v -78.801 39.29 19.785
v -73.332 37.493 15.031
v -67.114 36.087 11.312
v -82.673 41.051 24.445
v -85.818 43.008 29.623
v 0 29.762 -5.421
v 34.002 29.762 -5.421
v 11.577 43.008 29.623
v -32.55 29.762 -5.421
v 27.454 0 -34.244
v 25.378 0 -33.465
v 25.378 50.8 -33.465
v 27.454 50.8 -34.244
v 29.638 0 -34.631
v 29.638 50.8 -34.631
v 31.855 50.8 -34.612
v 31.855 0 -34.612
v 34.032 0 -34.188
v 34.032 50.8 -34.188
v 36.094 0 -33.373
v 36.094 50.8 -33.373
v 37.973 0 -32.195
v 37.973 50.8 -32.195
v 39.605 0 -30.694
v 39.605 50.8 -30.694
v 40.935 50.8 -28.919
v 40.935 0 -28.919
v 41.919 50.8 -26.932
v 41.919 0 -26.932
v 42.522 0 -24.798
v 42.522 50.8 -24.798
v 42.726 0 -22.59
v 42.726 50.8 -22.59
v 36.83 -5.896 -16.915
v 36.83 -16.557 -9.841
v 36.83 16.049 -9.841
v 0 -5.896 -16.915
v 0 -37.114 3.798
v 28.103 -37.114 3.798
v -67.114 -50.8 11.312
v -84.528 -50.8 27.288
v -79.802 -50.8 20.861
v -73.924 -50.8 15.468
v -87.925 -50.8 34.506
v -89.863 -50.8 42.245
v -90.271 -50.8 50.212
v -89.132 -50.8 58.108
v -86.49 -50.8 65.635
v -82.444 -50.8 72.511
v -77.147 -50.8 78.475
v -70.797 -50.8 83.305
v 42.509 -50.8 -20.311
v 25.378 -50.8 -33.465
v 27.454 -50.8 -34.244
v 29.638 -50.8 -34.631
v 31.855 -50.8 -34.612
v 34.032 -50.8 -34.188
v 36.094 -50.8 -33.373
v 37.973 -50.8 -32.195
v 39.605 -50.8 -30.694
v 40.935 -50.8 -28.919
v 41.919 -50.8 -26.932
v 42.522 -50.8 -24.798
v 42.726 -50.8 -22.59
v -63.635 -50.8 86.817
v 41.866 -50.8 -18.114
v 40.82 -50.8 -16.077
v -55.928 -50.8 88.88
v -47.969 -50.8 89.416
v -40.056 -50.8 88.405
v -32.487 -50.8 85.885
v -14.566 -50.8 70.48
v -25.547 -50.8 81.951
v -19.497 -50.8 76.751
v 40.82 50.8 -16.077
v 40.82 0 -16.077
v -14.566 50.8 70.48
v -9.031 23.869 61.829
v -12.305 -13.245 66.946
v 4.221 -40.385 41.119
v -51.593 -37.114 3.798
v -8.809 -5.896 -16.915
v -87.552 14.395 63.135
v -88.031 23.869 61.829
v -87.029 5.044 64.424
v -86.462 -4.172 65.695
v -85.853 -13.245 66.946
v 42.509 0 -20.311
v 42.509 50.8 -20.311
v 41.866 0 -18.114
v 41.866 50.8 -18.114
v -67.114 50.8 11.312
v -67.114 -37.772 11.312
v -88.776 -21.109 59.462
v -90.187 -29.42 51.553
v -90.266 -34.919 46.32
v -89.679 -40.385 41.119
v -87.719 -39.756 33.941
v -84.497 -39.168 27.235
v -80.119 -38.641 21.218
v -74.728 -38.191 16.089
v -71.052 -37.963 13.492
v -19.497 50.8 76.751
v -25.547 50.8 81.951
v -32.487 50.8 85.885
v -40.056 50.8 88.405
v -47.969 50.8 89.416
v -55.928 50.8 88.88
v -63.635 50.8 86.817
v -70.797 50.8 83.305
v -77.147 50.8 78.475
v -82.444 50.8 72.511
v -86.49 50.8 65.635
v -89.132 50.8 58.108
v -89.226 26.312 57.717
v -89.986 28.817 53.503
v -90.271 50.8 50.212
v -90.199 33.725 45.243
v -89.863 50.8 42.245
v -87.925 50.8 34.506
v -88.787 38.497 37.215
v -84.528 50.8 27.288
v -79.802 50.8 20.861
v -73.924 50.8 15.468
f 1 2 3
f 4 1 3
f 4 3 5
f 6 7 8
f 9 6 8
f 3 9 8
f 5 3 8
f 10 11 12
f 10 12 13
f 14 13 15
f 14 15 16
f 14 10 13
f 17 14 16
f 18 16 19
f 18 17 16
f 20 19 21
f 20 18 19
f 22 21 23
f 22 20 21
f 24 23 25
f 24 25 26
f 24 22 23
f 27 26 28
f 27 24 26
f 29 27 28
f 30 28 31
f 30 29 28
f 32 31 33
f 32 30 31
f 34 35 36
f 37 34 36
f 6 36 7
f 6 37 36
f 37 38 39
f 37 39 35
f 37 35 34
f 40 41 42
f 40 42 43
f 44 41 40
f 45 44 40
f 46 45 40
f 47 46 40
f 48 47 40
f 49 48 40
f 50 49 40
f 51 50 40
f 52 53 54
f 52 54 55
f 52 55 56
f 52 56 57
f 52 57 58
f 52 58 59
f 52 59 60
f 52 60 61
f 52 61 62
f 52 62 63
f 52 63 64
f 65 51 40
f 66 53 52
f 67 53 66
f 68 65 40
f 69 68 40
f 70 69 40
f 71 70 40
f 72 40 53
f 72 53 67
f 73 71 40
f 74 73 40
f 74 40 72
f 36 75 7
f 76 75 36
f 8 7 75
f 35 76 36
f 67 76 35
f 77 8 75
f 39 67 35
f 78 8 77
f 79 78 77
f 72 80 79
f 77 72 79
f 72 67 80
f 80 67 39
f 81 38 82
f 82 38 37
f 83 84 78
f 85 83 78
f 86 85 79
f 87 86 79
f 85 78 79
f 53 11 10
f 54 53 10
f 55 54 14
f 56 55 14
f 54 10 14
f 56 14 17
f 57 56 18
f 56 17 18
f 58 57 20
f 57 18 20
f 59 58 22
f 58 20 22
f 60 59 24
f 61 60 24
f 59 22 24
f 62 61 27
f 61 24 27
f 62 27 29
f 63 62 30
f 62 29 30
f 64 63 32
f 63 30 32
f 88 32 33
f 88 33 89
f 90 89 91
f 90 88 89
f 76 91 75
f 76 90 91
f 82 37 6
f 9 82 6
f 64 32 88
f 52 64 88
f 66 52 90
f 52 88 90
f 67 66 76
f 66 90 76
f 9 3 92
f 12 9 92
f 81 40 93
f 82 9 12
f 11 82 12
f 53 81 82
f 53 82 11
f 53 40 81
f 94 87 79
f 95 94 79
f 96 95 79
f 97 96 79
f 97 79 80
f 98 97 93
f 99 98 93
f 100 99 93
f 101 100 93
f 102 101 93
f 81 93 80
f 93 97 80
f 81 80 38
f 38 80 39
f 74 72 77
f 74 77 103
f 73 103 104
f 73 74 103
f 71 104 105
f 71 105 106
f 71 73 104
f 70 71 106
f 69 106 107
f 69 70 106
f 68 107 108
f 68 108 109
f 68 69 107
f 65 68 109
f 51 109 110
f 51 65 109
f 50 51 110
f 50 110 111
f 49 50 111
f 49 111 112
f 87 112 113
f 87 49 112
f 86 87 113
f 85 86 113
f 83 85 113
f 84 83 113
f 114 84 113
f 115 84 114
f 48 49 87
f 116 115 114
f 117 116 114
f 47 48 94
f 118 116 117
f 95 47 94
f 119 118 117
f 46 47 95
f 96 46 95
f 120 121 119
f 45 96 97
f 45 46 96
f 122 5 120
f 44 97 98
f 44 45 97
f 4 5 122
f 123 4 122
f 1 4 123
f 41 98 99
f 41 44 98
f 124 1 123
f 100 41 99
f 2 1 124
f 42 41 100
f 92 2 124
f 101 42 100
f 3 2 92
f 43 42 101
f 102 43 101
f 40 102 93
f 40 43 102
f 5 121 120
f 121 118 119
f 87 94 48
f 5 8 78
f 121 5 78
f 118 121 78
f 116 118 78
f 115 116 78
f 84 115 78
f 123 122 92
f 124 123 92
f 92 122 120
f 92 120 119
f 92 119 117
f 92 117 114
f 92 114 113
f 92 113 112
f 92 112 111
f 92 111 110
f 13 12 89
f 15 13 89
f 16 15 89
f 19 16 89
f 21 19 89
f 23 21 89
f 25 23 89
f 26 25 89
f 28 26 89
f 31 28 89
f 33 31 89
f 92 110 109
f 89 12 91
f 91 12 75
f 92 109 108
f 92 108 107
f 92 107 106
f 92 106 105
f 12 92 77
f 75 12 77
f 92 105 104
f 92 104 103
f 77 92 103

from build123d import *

# Parameters (mm, degrees)
F1_DEPTH      = 50.8
F3_DEPTH      = 110.998
F3_DEPTH_BACK = 36.83


with BuildPart() as f1:
    # F0 (on Front) → F1 (new body, symmetric)
    with BuildSketch(Plane.XZ):
        with BuildLine():
            ThreePointArc((-67.1143651523, 11.3118788967), (-27.3595519648, 13.4827854023), (-8.0827849332, 48.3190346183))
            ThreePointArc((-8.0827849332, 48.3190346183), (-9.7368789489, 59.8638451946), (-14.5660720417, 70.4797564755))
            ThreePointArc((-14.5660720417, 70.4797564755), (-79.9405579391, 75.6216888269), (-67.1143651523, 11.3118788967))
        make_face()
        with BuildLine():
            ThreePointArc((-14.5660720417, 70.4797564755), (-9.7368789489, 59.8638451946), (-8.0827849332, 48.3190346183))
            ThreePointArc((-8.0827849332, 48.3190346183), (-27.3595519648, 13.4827854023), (-67.1143651523, 11.3118788967))
            Line((-67.1143651523, 11.3118788967), (25.3778976938, -33.4652555138))
            ThreePointArc((25.3778976938, -33.4652555138), (21.608634566, -14.5663819856), (40.8203868988, -16.0774536137))
            Line((40.8203868988, -16.0774536137), (-14.5660720417, 70.4797564755))
        make_face()
        with BuildLine():
            ThreePointArc((42.7256455715, -22.589876526), (42.2395531131, -19.1971761709), (40.8203868988, -16.0774536137))
            ThreePointArc((40.8203868988, -16.0774536137), (21.608634566, -14.5663819856), (25.3778976938, -33.4652555138))
            ThreePointArc((25.3778976938, -33.4652555138), (37.0607371764, -32.8272861661), (42.7256455715, -22.589876526))
        make_face()
    extrude(amount=F1_DEPTH, both=True)

    # F2 (on Right) → F3 (cut, two sides)
    with BuildSketch(Plane.YZ) as f3_sk:
        Polygon((-13.2447925757, 66.9455137627), (-40.3845238139, 41.1189961655), (-37.1138849261, 3.7977295184), (-5.8957337036, -16.9146111783), (29.7620252487, -5.4212109251), (43.0083721541, 29.6231654646), (23.8685376165, 61.8293877944), align=None)
    extrude(amount=-F3_DEPTH, mode=Mode.SUBTRACT)
    extrude(f3_sk.sketch, amount=F3_DEPTH_BACK, mode=Mode.SUBTRACT)


solid = f1.part
